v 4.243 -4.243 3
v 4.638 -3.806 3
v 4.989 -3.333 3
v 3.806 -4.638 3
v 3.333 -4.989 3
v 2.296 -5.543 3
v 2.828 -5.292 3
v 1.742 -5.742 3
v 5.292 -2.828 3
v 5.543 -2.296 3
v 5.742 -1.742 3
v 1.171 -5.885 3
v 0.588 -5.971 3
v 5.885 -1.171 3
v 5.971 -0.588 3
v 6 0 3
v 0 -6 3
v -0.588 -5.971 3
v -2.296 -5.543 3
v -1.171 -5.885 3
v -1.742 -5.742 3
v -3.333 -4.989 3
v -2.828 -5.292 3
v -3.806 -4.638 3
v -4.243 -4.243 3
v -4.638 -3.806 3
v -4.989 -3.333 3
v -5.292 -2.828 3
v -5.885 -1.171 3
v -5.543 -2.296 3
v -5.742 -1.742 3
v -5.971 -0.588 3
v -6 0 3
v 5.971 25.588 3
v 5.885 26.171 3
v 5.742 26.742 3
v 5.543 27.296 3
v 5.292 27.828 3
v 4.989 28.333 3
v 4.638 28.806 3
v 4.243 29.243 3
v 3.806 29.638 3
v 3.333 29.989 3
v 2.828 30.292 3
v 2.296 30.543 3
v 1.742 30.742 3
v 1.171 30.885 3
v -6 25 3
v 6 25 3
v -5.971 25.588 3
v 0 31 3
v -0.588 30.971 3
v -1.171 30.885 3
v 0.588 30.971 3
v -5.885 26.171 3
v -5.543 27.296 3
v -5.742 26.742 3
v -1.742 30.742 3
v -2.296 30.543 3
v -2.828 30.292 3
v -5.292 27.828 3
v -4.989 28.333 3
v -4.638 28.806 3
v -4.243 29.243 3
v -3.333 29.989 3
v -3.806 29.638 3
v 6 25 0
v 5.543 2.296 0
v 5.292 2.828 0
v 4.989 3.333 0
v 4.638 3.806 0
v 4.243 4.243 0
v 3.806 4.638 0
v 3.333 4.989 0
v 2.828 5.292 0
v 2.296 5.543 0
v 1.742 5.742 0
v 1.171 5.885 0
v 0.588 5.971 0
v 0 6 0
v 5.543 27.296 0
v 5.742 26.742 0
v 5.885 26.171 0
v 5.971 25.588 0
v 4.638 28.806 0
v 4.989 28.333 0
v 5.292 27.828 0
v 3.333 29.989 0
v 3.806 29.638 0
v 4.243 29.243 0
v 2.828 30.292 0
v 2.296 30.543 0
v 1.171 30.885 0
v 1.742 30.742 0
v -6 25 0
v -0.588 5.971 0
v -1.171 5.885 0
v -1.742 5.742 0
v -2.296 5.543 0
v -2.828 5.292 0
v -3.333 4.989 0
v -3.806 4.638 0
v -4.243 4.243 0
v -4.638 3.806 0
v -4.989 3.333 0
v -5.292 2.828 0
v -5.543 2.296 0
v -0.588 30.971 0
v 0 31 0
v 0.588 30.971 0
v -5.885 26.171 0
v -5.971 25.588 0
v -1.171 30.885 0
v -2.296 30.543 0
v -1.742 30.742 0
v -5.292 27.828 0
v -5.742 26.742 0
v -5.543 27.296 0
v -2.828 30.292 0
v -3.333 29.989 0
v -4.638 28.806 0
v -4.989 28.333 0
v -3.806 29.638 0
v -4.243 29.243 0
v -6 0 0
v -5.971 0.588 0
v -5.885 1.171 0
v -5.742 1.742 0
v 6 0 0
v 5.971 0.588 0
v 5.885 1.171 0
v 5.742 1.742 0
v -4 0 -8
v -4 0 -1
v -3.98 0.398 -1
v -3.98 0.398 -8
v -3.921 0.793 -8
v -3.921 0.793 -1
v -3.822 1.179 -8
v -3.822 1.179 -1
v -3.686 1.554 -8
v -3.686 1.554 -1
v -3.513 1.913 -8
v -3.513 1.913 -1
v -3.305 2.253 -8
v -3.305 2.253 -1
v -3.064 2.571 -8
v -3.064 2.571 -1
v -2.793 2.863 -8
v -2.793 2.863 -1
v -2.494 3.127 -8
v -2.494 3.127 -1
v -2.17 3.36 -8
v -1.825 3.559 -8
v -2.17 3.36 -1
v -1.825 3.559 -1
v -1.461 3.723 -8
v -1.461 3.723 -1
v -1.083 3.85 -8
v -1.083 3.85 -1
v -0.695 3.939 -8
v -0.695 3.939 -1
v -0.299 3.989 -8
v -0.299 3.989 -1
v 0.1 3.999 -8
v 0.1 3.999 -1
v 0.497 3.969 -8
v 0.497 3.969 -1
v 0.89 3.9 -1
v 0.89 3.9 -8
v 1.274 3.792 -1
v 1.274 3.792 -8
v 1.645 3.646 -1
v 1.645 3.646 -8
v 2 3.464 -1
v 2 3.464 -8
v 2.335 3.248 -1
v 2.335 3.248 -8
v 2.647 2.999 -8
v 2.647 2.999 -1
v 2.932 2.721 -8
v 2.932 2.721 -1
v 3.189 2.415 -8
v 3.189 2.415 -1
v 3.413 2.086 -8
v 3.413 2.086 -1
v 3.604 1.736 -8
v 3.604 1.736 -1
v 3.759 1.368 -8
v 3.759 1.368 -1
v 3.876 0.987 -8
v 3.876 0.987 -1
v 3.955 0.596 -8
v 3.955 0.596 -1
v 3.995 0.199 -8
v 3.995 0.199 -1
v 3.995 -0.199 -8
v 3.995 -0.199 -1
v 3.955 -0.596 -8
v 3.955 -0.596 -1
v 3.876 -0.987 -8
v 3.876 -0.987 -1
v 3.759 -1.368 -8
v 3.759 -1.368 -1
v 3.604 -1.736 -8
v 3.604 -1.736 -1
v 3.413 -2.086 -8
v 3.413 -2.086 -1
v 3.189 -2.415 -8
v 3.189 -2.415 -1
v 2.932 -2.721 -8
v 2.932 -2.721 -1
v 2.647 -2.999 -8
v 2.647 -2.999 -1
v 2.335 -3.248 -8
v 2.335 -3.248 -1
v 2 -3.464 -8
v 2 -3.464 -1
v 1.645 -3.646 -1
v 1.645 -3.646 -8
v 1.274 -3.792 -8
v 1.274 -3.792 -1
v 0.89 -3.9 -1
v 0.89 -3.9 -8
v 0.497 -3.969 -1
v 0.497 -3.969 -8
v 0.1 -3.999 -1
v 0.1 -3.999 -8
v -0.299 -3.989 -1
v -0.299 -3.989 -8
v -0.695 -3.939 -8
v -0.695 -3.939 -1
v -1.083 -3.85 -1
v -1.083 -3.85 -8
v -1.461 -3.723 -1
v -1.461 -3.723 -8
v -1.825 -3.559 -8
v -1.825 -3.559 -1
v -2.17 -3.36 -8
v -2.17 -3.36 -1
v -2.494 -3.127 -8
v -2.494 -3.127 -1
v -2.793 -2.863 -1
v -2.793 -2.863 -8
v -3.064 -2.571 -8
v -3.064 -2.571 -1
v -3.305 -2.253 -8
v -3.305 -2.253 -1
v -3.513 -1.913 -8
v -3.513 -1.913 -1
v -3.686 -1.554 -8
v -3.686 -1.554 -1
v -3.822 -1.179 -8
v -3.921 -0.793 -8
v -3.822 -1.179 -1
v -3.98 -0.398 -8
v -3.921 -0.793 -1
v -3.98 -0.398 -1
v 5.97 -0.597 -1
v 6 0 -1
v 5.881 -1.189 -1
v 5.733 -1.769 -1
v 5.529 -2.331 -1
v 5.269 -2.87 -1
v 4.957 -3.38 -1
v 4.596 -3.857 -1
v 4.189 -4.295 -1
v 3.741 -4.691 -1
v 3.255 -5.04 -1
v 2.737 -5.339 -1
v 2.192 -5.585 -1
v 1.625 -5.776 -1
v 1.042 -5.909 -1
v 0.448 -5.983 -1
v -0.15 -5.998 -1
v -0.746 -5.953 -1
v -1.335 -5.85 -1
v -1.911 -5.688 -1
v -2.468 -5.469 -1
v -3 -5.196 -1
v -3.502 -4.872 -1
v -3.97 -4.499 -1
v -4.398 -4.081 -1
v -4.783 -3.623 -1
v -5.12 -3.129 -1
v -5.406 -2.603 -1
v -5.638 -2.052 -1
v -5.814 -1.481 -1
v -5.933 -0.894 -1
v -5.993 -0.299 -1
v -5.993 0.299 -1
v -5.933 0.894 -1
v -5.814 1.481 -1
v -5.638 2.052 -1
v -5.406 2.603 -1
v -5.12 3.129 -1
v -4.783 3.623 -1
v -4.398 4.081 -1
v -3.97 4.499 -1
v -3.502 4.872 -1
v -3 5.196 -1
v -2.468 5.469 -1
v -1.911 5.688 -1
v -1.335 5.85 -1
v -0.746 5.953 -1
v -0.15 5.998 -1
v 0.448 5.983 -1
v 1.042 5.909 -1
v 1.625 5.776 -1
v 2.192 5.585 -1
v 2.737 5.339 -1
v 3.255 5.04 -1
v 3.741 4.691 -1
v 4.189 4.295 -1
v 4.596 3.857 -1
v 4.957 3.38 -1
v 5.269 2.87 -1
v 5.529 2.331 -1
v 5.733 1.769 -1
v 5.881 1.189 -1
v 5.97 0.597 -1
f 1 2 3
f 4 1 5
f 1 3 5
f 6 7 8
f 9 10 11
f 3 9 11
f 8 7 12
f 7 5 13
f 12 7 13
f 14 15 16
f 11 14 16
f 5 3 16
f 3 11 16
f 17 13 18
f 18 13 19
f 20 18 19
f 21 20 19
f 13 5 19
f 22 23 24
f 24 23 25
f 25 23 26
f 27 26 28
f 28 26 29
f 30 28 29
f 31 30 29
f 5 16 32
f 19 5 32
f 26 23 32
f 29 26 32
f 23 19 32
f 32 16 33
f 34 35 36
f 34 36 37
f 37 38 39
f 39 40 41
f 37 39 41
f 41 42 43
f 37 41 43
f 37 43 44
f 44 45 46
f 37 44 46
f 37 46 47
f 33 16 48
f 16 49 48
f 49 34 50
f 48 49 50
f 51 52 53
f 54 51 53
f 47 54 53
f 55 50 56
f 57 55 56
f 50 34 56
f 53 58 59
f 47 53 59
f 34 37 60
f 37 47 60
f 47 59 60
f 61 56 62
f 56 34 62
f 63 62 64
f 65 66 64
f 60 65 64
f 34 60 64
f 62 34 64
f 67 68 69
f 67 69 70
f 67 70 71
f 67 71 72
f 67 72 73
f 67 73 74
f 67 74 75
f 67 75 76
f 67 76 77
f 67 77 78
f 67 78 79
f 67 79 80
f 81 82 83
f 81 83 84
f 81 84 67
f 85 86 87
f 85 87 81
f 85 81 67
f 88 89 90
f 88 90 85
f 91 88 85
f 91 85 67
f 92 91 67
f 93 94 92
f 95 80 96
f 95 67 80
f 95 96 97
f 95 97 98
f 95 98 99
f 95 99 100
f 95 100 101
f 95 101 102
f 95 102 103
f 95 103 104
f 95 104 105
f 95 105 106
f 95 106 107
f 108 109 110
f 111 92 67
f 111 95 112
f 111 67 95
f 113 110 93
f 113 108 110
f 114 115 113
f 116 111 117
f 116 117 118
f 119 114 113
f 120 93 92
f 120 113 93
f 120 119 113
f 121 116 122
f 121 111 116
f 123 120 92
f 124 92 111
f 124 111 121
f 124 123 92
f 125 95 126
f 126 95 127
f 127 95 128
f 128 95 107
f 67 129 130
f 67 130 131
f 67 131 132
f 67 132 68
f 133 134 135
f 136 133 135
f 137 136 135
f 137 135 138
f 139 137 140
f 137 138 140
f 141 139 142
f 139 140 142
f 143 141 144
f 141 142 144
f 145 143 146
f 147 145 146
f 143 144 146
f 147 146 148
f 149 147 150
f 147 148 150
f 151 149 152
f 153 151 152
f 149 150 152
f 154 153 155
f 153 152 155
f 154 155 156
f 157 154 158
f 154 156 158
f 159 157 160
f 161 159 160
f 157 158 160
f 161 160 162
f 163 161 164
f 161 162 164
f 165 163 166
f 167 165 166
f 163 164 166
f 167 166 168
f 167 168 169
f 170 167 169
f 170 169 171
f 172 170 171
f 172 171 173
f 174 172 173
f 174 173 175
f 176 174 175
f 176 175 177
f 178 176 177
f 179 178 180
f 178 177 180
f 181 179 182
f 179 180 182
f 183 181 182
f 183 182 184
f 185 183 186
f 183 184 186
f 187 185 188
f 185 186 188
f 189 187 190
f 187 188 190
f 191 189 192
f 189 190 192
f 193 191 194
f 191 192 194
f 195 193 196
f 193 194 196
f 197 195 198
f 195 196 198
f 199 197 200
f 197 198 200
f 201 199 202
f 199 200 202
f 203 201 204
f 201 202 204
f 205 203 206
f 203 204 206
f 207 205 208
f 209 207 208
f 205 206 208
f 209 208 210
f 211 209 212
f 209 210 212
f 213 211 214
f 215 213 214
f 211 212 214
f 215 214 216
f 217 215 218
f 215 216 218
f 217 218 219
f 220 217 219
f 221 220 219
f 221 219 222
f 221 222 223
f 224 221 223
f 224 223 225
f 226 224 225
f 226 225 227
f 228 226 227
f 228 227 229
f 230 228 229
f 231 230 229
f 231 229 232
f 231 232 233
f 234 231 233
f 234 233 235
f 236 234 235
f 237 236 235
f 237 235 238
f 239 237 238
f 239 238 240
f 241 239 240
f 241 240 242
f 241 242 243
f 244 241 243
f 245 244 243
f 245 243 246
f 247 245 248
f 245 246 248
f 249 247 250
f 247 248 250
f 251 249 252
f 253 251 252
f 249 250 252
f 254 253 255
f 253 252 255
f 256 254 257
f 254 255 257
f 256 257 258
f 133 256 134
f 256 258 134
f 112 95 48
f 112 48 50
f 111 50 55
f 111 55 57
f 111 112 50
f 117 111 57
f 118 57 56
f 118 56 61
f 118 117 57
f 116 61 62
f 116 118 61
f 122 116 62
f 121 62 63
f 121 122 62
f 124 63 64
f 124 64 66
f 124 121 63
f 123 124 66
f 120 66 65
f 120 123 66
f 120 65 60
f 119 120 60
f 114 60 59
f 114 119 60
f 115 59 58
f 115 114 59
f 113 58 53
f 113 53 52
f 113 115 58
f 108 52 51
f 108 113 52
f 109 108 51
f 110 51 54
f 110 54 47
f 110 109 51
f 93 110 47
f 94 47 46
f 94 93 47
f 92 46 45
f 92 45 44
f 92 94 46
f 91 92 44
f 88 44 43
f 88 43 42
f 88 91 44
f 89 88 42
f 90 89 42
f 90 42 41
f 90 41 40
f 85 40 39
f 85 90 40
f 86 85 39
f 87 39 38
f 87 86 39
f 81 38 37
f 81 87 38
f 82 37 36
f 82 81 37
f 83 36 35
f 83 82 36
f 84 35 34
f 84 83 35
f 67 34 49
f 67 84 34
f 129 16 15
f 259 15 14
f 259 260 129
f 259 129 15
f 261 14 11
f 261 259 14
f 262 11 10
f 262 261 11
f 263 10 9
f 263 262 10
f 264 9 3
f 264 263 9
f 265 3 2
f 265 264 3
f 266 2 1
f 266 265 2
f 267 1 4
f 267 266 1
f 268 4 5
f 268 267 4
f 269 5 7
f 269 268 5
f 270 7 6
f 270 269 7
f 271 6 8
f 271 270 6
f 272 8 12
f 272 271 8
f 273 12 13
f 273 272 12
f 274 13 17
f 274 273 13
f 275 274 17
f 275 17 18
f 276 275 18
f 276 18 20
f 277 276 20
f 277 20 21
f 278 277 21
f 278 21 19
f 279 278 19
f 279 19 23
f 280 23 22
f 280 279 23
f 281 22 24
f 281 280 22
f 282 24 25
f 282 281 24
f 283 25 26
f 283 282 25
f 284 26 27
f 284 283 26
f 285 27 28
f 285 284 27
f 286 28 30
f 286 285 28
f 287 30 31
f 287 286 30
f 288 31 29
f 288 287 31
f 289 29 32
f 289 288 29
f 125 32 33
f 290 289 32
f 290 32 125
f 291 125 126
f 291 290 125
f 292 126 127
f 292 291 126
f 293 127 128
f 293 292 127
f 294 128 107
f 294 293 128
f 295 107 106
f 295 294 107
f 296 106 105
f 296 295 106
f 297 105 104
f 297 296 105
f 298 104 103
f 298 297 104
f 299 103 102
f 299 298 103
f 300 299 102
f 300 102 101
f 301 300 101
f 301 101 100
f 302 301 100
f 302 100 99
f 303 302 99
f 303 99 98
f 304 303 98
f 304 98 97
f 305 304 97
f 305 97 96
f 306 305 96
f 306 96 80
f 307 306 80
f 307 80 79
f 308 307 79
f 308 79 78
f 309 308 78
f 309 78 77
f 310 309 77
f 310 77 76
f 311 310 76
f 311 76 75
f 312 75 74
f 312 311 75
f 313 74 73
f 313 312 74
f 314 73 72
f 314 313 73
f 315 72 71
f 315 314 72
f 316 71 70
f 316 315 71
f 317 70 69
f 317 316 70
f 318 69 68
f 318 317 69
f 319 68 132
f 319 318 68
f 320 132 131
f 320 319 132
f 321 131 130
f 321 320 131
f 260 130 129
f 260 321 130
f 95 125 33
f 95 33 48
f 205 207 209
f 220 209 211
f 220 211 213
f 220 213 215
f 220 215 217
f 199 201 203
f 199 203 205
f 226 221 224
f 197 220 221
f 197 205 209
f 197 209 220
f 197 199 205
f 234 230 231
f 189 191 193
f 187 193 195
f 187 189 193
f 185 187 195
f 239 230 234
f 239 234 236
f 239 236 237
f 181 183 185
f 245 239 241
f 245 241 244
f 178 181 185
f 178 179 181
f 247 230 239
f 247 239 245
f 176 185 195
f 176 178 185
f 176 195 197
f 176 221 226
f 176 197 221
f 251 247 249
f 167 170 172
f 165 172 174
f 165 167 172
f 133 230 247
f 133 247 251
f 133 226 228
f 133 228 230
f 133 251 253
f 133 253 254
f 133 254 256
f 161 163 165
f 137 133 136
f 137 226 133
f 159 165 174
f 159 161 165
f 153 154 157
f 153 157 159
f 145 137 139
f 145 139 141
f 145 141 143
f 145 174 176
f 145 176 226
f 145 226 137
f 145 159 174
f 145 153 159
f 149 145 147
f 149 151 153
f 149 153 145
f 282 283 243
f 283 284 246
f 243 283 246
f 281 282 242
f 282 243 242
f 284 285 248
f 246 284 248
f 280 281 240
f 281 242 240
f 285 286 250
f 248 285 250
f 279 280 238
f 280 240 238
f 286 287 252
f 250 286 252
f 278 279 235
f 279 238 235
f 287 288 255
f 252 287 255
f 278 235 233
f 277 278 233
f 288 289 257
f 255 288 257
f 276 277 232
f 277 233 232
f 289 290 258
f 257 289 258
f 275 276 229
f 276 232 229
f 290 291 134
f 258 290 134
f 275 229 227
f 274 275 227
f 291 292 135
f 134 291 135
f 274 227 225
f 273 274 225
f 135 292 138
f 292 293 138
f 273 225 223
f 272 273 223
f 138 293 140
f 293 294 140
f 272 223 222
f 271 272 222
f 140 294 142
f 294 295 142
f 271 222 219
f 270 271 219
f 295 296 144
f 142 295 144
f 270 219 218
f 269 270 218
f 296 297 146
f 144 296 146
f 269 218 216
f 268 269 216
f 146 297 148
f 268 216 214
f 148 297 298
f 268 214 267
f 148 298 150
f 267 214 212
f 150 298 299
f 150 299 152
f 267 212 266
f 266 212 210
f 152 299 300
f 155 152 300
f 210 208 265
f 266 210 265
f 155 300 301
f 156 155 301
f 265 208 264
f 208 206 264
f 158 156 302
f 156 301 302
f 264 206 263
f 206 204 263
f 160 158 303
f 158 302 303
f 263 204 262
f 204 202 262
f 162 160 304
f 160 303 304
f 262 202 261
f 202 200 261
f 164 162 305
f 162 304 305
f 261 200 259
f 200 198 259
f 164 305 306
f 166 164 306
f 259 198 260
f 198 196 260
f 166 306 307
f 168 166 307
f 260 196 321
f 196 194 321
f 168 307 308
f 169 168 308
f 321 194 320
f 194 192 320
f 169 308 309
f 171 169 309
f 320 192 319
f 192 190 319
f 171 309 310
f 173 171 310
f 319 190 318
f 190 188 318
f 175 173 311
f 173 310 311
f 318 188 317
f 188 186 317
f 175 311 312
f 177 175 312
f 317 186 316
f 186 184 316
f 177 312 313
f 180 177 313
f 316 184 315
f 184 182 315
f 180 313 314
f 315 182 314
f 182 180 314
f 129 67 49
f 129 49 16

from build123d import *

# Parameters (mm, degrees)
SKETCH1_R           = 6
BOSS_EXTRUDE1_DEPTH = 1
BOSS_EXTRUDE2_DEPTH = 3
SKETCH3_R           = 4
BOSS_EXTRUDE3_DEPTH = 7


with BuildPart() as part:
    # Sketch1 → Boss-Extrude1 (new body)
    with BuildSketch(Plane.XY):
        Circle(SKETCH1_R)
    extrude(amount=-BOSS_EXTRUDE1_DEPTH)

    # Sketch2 → Boss-Extrude2 (add)
    with BuildSketch(Plane.XY):
        with BuildLine():
            Line((-6, 0), (-6, 25))
            ThreePointArc((-6, 25), (0, 31), (6, 25))
            Line((6, 25), (6, 0))
            ThreePointArc((6, 0), (0, -6), (-6, 0))
        make_face()
    extrude(amount=BOSS_EXTRUDE2_DEPTH)

    # Sketch3 → Boss-Extrude3 (add)
    with BuildSketch(Plane(origin=(0, 0, -1), x_dir=(-1, 0, 0), z_dir=(0, 0, -1))):
        Circle(SKETCH3_R)
    extrude(amount=BOSS_EXTRUDE3_DEPTH)


solid = part.part
